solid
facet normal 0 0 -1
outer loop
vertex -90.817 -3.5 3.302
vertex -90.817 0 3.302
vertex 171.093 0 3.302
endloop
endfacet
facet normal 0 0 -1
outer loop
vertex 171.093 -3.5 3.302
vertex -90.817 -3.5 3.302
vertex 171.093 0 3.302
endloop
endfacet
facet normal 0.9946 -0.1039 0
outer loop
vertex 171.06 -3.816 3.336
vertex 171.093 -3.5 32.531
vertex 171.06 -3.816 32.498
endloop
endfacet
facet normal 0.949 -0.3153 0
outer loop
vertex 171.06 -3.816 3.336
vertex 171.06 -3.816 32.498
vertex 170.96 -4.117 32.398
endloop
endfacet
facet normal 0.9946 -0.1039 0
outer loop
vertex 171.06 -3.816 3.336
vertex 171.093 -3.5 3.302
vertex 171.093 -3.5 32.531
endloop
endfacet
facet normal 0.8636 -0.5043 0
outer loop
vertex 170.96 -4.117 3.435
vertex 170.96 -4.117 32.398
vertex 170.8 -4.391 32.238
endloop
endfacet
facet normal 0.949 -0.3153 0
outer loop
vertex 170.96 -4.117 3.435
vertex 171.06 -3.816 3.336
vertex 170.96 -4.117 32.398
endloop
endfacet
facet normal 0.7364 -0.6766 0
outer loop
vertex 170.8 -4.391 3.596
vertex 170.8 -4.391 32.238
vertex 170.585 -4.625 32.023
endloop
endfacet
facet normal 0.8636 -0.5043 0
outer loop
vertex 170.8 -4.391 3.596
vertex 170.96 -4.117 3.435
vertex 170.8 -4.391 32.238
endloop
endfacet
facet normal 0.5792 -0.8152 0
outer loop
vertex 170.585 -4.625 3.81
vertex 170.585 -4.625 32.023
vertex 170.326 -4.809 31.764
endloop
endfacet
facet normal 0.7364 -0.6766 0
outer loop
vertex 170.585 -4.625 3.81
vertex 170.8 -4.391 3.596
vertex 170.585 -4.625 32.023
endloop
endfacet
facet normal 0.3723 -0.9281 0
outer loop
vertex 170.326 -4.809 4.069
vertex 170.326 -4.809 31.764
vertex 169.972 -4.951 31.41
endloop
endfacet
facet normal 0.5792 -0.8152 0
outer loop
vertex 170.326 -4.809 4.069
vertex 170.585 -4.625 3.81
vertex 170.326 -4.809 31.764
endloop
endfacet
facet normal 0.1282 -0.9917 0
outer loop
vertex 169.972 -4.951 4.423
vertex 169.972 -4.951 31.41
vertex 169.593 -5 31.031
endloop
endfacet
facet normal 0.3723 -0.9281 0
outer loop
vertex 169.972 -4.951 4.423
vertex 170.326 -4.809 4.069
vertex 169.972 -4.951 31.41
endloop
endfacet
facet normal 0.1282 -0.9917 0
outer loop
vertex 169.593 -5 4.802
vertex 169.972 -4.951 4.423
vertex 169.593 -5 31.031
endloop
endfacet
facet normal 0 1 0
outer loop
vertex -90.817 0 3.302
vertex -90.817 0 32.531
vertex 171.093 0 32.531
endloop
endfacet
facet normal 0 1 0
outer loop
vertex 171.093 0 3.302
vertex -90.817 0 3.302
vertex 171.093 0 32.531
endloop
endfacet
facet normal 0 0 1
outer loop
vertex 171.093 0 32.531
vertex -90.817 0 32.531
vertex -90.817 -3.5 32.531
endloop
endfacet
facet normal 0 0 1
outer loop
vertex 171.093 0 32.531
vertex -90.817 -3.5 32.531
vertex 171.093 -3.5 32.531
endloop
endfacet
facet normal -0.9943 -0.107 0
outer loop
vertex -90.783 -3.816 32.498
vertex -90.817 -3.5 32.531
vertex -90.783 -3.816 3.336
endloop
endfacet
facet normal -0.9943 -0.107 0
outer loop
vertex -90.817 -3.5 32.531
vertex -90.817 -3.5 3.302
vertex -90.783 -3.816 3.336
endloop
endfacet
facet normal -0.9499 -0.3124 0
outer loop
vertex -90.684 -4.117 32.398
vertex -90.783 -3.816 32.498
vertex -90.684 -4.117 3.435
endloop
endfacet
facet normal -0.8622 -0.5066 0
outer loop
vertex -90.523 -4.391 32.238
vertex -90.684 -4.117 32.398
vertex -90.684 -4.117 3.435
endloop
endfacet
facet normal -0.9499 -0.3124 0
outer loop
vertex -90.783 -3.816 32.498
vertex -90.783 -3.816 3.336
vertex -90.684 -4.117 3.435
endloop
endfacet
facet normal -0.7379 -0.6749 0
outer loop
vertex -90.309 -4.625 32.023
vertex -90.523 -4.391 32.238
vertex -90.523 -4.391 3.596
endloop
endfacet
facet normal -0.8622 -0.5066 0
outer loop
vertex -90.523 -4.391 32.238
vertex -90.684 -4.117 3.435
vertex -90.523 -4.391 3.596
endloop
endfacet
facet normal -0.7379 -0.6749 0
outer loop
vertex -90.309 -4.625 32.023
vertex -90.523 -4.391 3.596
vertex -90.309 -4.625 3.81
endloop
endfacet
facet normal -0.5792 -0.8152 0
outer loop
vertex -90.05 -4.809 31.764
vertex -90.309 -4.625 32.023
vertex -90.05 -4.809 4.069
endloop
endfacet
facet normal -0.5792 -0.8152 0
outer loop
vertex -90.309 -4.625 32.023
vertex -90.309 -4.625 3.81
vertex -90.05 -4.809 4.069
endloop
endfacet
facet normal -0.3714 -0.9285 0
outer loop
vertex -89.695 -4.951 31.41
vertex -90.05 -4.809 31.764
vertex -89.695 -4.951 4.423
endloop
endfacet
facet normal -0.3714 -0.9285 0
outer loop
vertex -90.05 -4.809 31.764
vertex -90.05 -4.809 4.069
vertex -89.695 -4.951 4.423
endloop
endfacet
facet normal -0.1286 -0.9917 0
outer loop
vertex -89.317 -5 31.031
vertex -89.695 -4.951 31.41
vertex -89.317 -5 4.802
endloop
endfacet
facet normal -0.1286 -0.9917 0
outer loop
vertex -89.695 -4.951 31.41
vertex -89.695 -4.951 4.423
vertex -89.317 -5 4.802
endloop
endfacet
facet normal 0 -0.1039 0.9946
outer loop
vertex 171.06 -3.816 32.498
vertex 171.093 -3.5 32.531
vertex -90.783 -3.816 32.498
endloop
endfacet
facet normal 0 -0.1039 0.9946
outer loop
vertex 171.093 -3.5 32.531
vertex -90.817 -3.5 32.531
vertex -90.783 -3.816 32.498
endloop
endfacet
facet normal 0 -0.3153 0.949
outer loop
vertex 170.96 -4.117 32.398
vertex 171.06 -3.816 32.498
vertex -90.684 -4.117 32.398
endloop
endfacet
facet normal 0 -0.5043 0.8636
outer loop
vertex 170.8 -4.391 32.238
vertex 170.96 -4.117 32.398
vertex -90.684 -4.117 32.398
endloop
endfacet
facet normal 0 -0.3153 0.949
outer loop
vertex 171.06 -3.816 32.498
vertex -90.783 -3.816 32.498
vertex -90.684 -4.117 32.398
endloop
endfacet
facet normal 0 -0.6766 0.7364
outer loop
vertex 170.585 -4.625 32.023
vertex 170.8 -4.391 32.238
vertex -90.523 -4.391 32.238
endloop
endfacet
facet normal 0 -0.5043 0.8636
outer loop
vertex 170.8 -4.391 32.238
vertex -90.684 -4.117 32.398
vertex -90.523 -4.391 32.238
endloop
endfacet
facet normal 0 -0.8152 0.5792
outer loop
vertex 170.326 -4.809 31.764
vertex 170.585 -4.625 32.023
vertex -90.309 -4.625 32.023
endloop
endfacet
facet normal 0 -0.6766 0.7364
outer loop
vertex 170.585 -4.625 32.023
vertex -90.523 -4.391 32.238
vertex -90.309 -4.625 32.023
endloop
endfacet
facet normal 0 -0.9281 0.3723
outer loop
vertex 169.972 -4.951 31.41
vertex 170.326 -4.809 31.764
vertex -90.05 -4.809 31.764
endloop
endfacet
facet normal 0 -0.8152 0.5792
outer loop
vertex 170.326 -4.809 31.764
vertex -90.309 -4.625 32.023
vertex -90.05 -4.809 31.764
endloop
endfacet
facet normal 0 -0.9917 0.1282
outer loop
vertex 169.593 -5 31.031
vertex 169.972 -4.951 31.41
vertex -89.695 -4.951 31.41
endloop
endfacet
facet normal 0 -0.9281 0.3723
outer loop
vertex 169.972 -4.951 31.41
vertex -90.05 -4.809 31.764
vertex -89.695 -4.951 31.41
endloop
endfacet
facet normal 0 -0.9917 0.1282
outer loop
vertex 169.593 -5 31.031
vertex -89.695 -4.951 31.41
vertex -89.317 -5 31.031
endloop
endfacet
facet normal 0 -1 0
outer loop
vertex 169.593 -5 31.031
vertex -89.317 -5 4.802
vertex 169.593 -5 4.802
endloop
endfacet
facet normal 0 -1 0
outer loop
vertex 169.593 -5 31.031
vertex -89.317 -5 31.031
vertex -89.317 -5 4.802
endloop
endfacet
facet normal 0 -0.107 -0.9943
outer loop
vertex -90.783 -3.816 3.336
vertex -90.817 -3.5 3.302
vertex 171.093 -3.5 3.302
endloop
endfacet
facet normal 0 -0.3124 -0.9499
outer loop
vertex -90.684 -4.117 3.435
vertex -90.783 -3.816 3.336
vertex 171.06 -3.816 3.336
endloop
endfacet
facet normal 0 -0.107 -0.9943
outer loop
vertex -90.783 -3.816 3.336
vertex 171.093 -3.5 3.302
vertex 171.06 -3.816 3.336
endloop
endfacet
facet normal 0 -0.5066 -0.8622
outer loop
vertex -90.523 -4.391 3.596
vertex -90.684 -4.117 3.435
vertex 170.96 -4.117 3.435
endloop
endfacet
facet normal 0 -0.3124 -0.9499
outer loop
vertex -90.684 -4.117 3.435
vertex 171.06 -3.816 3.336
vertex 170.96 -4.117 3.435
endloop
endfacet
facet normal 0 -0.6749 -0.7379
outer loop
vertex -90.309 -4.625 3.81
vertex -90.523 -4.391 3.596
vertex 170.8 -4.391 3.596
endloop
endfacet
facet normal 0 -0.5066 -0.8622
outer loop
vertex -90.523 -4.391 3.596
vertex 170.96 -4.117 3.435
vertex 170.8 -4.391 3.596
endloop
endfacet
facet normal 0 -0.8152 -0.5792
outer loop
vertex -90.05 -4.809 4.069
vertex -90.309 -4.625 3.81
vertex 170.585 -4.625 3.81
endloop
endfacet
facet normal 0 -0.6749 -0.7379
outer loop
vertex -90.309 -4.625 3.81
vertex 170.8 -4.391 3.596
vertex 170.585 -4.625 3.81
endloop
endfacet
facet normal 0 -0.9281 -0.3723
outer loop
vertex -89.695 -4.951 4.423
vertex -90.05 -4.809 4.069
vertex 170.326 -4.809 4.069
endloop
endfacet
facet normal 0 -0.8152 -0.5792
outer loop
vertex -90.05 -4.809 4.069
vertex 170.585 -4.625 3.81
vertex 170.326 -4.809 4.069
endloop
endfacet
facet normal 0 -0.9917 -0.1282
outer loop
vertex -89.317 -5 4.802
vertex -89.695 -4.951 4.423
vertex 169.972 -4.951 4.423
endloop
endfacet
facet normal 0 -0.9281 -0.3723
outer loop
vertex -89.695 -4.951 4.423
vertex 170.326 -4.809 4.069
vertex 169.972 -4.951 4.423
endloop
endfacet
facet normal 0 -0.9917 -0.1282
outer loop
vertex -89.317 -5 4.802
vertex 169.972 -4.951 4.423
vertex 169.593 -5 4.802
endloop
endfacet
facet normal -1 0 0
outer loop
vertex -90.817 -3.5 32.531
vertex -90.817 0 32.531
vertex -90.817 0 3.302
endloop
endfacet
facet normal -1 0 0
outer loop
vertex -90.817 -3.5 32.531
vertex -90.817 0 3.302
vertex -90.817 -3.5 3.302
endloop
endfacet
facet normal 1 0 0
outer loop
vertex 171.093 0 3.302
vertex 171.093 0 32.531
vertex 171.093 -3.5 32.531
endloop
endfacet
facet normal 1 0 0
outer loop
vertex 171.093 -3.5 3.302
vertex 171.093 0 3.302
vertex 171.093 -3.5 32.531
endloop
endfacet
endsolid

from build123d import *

# Parameters (mm, degrees)
F0_W     = 181.633234024
F0_H     = 57.9366758466
F1_DEPTH = 5
F2_DEPTH = 29.229
F3_DEPTH = 261.91
F4_R     = 1.5


with BuildPart() as f1:
    # F0 (on Front) → F1 (new body)
    with BuildSketch(Plane.XZ):
        with Locations((0, 3.5628564656)):
            Rectangle(F0_W, F0_H)
    extrude(amount=F1_DEPTH)

    # F2 (intersect): a face of the model
    f2_faces = [f1.faces().sort_by_distance(p)[0] for p in [
        (0, -2.5, 32.5311943889),
    ]]
    extrude(f2_faces, amount=-F2_DEPTH, mode=Mode.INTERSECT)

    # F3 (add): a face of the model
    f3_faces = [f1.faces().sort_by_distance(p)[0] for p in [
        (-90.816617012, -2.5, 17.9166943889),
    ]]
    extrude(f3_faces, amount=-F3_DEPTH)

    # F4
    f4_edges = [f1.edges().sort_by_distance(p)[0] for p in [
        (40.138383, -5, 3.302194),
        (171.093383, -5, 17.916694),
        (40.138383, -5, 32.531194),
        (-90.816617, -5, 17.916694),
    ]]
    fillet(f4_edges, radius=F4_R)


solid = f1.part
